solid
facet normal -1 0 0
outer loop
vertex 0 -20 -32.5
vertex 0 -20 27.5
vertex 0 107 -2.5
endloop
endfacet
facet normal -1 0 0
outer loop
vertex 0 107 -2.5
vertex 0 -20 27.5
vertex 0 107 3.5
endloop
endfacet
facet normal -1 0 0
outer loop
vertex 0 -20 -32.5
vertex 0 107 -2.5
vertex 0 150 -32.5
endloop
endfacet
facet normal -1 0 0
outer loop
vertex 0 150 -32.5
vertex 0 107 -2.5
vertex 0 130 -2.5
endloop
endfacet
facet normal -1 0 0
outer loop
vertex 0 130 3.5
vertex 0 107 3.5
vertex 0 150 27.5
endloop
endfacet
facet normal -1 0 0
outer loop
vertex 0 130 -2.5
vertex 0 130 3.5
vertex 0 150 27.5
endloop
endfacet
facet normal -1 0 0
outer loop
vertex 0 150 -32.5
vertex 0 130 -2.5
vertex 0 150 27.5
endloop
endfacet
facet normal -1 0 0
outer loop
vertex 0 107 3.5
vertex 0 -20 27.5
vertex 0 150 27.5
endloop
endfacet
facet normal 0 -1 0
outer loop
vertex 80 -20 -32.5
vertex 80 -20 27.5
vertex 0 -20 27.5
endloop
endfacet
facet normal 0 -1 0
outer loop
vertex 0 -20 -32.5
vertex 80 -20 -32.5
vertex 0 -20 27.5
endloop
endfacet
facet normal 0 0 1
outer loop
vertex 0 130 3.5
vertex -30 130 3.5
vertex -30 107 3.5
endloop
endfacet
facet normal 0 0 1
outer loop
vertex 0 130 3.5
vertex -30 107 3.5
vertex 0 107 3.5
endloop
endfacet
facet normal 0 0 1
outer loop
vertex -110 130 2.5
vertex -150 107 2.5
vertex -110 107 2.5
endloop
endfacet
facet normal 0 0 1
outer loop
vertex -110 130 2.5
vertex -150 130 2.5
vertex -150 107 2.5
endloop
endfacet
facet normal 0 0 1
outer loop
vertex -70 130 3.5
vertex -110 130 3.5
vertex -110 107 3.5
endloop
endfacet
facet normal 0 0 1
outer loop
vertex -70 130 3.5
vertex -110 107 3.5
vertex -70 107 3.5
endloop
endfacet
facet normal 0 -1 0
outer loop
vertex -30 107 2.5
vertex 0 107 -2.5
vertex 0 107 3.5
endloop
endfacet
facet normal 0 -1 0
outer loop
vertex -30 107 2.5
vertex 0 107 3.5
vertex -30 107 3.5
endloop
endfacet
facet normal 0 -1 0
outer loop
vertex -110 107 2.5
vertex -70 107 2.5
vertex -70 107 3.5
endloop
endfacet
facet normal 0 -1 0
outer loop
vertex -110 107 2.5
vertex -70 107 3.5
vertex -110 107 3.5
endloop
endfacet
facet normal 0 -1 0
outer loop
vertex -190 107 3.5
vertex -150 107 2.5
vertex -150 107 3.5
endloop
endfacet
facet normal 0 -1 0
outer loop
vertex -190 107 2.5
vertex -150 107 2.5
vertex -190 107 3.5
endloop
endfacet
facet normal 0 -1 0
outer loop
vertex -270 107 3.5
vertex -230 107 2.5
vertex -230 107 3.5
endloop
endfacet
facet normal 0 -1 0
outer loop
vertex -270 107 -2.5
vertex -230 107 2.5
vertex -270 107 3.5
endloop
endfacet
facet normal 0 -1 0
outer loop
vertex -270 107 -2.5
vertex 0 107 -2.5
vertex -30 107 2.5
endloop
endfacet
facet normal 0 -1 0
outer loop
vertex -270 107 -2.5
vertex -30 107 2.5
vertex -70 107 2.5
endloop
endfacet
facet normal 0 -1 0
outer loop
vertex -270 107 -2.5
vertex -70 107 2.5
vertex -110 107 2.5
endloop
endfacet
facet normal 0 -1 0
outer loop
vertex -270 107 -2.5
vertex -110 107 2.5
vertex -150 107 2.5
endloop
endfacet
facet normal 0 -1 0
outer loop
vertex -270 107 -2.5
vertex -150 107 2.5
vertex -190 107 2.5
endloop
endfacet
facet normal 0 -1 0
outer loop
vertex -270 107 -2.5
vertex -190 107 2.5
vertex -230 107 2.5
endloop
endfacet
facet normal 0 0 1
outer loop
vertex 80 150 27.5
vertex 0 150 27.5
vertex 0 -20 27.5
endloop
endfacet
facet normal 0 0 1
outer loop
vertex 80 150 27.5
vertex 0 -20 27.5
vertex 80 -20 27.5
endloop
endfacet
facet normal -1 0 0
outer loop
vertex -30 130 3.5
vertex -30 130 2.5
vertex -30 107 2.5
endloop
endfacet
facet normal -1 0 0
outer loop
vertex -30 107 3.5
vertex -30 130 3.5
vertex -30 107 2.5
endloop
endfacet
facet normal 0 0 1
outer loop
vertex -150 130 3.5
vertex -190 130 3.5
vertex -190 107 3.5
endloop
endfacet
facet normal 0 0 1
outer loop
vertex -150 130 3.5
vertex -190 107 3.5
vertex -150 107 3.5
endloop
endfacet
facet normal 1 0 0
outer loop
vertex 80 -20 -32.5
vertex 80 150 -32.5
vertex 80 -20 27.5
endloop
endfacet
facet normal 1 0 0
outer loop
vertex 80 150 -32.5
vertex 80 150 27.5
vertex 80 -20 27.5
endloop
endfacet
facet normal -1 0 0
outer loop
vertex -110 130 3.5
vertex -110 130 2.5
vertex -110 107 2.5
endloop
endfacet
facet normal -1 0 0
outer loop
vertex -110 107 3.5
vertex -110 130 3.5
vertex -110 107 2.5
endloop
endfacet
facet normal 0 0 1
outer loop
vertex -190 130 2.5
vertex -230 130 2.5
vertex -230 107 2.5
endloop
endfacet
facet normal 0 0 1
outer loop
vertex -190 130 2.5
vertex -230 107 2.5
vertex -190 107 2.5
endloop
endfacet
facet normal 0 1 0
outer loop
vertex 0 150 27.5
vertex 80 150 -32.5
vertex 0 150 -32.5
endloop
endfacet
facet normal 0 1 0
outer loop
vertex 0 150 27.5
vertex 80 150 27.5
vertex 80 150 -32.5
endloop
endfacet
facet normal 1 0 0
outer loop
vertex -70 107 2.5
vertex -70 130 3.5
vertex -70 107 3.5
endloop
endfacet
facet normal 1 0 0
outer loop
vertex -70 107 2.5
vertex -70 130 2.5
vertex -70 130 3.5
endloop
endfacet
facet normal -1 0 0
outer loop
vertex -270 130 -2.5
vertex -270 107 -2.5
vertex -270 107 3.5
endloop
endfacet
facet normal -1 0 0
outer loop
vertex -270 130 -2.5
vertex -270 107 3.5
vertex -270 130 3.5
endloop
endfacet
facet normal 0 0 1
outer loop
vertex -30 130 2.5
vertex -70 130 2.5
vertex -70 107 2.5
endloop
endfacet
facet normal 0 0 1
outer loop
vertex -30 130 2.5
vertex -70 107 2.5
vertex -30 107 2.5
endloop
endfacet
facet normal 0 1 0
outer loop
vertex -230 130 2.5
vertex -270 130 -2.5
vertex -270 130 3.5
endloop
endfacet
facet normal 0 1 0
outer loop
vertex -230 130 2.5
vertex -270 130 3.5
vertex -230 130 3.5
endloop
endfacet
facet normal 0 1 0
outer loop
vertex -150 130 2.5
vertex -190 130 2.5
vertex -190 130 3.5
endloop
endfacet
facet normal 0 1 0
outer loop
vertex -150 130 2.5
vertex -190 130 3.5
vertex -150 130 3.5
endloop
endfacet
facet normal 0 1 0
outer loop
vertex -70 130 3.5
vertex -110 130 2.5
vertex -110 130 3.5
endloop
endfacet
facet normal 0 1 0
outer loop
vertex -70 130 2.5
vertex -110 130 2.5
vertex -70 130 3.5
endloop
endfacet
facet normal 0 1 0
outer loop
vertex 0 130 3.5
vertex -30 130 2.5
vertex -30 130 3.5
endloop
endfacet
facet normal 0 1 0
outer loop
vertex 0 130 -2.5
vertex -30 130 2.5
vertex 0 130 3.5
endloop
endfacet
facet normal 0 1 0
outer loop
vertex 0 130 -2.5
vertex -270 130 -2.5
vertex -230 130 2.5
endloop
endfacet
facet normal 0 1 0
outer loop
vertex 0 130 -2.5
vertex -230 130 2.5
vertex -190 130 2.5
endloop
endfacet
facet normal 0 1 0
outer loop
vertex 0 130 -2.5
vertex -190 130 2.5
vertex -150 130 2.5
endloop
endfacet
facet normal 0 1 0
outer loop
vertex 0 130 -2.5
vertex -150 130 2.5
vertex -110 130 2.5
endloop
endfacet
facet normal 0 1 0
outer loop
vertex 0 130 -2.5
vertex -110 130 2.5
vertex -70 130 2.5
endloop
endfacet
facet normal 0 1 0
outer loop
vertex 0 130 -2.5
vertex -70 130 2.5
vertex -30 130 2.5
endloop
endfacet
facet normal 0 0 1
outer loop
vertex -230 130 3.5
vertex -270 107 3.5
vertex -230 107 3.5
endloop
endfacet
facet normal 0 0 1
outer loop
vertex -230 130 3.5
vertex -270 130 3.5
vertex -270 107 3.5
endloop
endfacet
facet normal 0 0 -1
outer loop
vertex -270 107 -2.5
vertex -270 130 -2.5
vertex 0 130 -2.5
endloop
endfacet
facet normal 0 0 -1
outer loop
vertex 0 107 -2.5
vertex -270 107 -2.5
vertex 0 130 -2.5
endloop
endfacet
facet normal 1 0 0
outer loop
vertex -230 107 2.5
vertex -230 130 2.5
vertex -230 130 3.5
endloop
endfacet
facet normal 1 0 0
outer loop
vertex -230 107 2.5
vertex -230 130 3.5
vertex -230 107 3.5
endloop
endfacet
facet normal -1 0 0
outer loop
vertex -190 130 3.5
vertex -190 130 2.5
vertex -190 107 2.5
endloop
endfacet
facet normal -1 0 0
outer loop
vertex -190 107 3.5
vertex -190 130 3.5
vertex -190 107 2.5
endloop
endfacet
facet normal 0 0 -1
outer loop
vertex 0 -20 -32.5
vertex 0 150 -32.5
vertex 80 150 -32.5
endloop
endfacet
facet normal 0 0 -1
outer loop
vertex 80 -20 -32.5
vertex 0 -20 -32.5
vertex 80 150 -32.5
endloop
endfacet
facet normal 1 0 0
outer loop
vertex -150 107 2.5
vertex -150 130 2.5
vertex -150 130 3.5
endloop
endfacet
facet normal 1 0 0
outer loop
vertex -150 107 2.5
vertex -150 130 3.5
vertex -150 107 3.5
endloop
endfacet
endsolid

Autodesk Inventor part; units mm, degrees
ref_plane "YZ Plane" through (0, 0, 0) normal (1, 0, 0) x (0, 1, 0)
ref_plane "XZ Plane" through (0, 0, 0) normal (0, 1, 0) x (-1, 0, 0)
ref_plane "XY Plane" through (0, 0, 0) normal (0, 0, 1) x (1, 0, 0)
sketch "Sketch1" plane through (0, 0, 0) normal (0, 0, 1) x (1, 0, 0)
  point P0 (0, 0)
sketch "Sketch2" plane through (0, 0, 0) normal (0, 0, 1) x (1, 0, 0)
  line L0 (-270, 130) -> (30, 130)
  line L1 (30, 130) -> (30, 107)
  line L2 (30, 107) -> (-270, 107)
  line L3 (-270, 107) -> (-270, 130)
  line L4 (0, 0) -> (80, 0)
  line L5 (80, 0) -> (80, 150)
  line L6 (80, 150) -> (0, 150)
  line L7 (0, 150) -> (0, 0)
  dimension "d0" = 300
  dimension "d1" = 23
  dimension "d2" = 80
  dimension "d3" = 150
  dimension "d4" = 30
  dimension "d5" = 20
extrude "Extrusion1" add sketch "Sketch2" along normal mid plane 5 contours L0 L7 L2 L3 | L0 L1 L2 L7
sketch "Sketch3" plane through (0, 0, 2.5) normal (0, 0, 1) x (1, 0, 0)
  point P0 (0, 0)
sketch "Sketch4" plane through (0, 0, 2.5) normal (0, 0, 1) x (1, 0, 0)
  point P0 (0, 0)
sketch "Sketch5" plane through (0, 0, -2.5) normal (0, 0, -1) x (-1, 0, 0)
  line L0 (0, 0) -> (-80, 0)
  line L1 (-80, 0) -> (-80, 150)
  line L2 (-80, 150) -> (0, 150)
  line L3 (0, 150) -> (0, 0)
  dimension "d8" = 80
  dimension "d9" = 150
extrude "Extrusion2" add sketch "Sketch5" along normal mid plane 60
sketch "Sketch6" plane through (0, 0, 2.5) normal (0, 0, 1) x (1, 0, 0)
  line L0 (-270, 107) -> (-270, 130) projected
  line L1 (-270, 130) -> (-230, 130)
  line L2 (-230, 130) -> (-230, 107)
  line L3 (-230, 107) -> (-270, 107)
  line L4 (-270, 107) -> (-270, 130)
  point P0 (0, 0)
  dimension "d12" = 40
  dimension "d13" = 23
extrude "Extrusion3" add sketch "Sketch6" along normal blind 1
sketch "Sketch7" plane through (0, 0, 2.5) normal (0, 0, 1) x (1, 0, 0)
  line L0 (-230.0222, 129.8127) -> (-190.0222, 129.8127)
  line L1 (-190.0222, 129.8127) -> (-190.0222, 106.8127)
  line L2 (-190.0222, 106.8127) -> (-230.0222, 106.8127)
  line L3 (-230.0222, 106.8127) -> (-230.0222, 129.8127)
  point P0 (0, 0)
  dimension "d16" = 40
  dimension "d17" = 23
sketch "Sketch8" plane through (0, 0, 2.5) normal (0, 0, 1) x (1, 0, 0)
  line L0 (-230, 107) -> (-230, 130) projected
  line L1 (-230, 130) -> (-190, 130)
  line L2 (-190, 130) -> (-190, 107)
  line L3 (-190, 107) -> (-230, 107)
  line L4 (-230, 107) -> (-230, 130)
  line L5 (-190, 130) -> (-150, 130)
  line L6 (-150, 130) -> (-150, 107)
  line L7 (-150, 107) -> (-190, 107)
  line L8 (-190, 107) -> (-190, 130)
  point P0 (0, 0)
  dimension "d18" = 40
  dimension "d19" = 23
  dimension "d20" = 40
  dimension "d21" = 23
extrude "Extrusion4" add sketch "Sketch8" along normal blind 1 contours L2 L5 L6 L7
sketch "Sketch9" plane through (0, 0, 2.5) normal (0, 0, 1) x (1, 0, 0)
  line L0 (-150, 130) -> (-110, 130)
  line L1 (-110, 130) -> (-110, 107)
  line L2 (-110, 107) -> (-150, 107)
  line L3 (-150, 107) -> (-150, 130)
  line L4 (-110, 130) -> (-70, 130)
  line L5 (-70, 130) -> (-70, 107)
  line L6 (-70, 107) -> (-110, 107)
  line L7 (-110, 107) -> (-110, 130)
  point P0 (0, 0)
  dimension "d24" = 40
  dimension "d25" = 23
  dimension "d26" = 40
  dimension "d27" = 23
extrude "Extrusion5" add sketch "Sketch9" along normal blind 1 contours L4 L5 L6 L1
sketch "Sketch10" plane through (0, 0, 2.5) normal (0, 0, 1) x (1, 0, 0)
  line L0 (-70, 130) -> (-70, 107) projected
  line L1 (-70, 130) -> (-30, 130)
  line L2 (-30, 130) -> (-30, 107)
  line L3 (-30, 107) -> (-70, 107)
  line L4 (-70, 107) -> (-70, 130)
  line L5 (0, 107) -> (0, 130) projected
  line L6 (-30, 130) -> (0, 130)
  line L7 (0, 130) -> (0, 107)
  line L8 (0, 107) -> (-30, 107)
  line L9 (-30, 107) -> (-30, 130)
  point P0 (0, 0)
  dimension "d30" = 40
  dimension "d31" = 23
  dimension "d32" = 30
  dimension "d33" = 23
extrude "Extrusion6" add sketch "Sketch10" along normal blind 1 contours L6 L5 L8 L2
sketch "Sketch11" plane through (0, 0, 27.5) normal (0, 0, 1) x (1, 0, 0)
  point P0 (0, 0)
sketch "Sketch12" plane through (0, 0, 27.5) normal (0, 0, 1) x (1, 0, 0)
  line L0 (0, 0) -> (80, 0) projected
  line L1 (80, 0) -> (80, -20)
  line L2 (80, -20) -> (0, -20)
  line L3 (0, -20) -> (0, 0)
  dimension "d36" = 20
extrude "Extrusion7" add sketch "Sketch12" against normal blind 60
properties part number "bar"
